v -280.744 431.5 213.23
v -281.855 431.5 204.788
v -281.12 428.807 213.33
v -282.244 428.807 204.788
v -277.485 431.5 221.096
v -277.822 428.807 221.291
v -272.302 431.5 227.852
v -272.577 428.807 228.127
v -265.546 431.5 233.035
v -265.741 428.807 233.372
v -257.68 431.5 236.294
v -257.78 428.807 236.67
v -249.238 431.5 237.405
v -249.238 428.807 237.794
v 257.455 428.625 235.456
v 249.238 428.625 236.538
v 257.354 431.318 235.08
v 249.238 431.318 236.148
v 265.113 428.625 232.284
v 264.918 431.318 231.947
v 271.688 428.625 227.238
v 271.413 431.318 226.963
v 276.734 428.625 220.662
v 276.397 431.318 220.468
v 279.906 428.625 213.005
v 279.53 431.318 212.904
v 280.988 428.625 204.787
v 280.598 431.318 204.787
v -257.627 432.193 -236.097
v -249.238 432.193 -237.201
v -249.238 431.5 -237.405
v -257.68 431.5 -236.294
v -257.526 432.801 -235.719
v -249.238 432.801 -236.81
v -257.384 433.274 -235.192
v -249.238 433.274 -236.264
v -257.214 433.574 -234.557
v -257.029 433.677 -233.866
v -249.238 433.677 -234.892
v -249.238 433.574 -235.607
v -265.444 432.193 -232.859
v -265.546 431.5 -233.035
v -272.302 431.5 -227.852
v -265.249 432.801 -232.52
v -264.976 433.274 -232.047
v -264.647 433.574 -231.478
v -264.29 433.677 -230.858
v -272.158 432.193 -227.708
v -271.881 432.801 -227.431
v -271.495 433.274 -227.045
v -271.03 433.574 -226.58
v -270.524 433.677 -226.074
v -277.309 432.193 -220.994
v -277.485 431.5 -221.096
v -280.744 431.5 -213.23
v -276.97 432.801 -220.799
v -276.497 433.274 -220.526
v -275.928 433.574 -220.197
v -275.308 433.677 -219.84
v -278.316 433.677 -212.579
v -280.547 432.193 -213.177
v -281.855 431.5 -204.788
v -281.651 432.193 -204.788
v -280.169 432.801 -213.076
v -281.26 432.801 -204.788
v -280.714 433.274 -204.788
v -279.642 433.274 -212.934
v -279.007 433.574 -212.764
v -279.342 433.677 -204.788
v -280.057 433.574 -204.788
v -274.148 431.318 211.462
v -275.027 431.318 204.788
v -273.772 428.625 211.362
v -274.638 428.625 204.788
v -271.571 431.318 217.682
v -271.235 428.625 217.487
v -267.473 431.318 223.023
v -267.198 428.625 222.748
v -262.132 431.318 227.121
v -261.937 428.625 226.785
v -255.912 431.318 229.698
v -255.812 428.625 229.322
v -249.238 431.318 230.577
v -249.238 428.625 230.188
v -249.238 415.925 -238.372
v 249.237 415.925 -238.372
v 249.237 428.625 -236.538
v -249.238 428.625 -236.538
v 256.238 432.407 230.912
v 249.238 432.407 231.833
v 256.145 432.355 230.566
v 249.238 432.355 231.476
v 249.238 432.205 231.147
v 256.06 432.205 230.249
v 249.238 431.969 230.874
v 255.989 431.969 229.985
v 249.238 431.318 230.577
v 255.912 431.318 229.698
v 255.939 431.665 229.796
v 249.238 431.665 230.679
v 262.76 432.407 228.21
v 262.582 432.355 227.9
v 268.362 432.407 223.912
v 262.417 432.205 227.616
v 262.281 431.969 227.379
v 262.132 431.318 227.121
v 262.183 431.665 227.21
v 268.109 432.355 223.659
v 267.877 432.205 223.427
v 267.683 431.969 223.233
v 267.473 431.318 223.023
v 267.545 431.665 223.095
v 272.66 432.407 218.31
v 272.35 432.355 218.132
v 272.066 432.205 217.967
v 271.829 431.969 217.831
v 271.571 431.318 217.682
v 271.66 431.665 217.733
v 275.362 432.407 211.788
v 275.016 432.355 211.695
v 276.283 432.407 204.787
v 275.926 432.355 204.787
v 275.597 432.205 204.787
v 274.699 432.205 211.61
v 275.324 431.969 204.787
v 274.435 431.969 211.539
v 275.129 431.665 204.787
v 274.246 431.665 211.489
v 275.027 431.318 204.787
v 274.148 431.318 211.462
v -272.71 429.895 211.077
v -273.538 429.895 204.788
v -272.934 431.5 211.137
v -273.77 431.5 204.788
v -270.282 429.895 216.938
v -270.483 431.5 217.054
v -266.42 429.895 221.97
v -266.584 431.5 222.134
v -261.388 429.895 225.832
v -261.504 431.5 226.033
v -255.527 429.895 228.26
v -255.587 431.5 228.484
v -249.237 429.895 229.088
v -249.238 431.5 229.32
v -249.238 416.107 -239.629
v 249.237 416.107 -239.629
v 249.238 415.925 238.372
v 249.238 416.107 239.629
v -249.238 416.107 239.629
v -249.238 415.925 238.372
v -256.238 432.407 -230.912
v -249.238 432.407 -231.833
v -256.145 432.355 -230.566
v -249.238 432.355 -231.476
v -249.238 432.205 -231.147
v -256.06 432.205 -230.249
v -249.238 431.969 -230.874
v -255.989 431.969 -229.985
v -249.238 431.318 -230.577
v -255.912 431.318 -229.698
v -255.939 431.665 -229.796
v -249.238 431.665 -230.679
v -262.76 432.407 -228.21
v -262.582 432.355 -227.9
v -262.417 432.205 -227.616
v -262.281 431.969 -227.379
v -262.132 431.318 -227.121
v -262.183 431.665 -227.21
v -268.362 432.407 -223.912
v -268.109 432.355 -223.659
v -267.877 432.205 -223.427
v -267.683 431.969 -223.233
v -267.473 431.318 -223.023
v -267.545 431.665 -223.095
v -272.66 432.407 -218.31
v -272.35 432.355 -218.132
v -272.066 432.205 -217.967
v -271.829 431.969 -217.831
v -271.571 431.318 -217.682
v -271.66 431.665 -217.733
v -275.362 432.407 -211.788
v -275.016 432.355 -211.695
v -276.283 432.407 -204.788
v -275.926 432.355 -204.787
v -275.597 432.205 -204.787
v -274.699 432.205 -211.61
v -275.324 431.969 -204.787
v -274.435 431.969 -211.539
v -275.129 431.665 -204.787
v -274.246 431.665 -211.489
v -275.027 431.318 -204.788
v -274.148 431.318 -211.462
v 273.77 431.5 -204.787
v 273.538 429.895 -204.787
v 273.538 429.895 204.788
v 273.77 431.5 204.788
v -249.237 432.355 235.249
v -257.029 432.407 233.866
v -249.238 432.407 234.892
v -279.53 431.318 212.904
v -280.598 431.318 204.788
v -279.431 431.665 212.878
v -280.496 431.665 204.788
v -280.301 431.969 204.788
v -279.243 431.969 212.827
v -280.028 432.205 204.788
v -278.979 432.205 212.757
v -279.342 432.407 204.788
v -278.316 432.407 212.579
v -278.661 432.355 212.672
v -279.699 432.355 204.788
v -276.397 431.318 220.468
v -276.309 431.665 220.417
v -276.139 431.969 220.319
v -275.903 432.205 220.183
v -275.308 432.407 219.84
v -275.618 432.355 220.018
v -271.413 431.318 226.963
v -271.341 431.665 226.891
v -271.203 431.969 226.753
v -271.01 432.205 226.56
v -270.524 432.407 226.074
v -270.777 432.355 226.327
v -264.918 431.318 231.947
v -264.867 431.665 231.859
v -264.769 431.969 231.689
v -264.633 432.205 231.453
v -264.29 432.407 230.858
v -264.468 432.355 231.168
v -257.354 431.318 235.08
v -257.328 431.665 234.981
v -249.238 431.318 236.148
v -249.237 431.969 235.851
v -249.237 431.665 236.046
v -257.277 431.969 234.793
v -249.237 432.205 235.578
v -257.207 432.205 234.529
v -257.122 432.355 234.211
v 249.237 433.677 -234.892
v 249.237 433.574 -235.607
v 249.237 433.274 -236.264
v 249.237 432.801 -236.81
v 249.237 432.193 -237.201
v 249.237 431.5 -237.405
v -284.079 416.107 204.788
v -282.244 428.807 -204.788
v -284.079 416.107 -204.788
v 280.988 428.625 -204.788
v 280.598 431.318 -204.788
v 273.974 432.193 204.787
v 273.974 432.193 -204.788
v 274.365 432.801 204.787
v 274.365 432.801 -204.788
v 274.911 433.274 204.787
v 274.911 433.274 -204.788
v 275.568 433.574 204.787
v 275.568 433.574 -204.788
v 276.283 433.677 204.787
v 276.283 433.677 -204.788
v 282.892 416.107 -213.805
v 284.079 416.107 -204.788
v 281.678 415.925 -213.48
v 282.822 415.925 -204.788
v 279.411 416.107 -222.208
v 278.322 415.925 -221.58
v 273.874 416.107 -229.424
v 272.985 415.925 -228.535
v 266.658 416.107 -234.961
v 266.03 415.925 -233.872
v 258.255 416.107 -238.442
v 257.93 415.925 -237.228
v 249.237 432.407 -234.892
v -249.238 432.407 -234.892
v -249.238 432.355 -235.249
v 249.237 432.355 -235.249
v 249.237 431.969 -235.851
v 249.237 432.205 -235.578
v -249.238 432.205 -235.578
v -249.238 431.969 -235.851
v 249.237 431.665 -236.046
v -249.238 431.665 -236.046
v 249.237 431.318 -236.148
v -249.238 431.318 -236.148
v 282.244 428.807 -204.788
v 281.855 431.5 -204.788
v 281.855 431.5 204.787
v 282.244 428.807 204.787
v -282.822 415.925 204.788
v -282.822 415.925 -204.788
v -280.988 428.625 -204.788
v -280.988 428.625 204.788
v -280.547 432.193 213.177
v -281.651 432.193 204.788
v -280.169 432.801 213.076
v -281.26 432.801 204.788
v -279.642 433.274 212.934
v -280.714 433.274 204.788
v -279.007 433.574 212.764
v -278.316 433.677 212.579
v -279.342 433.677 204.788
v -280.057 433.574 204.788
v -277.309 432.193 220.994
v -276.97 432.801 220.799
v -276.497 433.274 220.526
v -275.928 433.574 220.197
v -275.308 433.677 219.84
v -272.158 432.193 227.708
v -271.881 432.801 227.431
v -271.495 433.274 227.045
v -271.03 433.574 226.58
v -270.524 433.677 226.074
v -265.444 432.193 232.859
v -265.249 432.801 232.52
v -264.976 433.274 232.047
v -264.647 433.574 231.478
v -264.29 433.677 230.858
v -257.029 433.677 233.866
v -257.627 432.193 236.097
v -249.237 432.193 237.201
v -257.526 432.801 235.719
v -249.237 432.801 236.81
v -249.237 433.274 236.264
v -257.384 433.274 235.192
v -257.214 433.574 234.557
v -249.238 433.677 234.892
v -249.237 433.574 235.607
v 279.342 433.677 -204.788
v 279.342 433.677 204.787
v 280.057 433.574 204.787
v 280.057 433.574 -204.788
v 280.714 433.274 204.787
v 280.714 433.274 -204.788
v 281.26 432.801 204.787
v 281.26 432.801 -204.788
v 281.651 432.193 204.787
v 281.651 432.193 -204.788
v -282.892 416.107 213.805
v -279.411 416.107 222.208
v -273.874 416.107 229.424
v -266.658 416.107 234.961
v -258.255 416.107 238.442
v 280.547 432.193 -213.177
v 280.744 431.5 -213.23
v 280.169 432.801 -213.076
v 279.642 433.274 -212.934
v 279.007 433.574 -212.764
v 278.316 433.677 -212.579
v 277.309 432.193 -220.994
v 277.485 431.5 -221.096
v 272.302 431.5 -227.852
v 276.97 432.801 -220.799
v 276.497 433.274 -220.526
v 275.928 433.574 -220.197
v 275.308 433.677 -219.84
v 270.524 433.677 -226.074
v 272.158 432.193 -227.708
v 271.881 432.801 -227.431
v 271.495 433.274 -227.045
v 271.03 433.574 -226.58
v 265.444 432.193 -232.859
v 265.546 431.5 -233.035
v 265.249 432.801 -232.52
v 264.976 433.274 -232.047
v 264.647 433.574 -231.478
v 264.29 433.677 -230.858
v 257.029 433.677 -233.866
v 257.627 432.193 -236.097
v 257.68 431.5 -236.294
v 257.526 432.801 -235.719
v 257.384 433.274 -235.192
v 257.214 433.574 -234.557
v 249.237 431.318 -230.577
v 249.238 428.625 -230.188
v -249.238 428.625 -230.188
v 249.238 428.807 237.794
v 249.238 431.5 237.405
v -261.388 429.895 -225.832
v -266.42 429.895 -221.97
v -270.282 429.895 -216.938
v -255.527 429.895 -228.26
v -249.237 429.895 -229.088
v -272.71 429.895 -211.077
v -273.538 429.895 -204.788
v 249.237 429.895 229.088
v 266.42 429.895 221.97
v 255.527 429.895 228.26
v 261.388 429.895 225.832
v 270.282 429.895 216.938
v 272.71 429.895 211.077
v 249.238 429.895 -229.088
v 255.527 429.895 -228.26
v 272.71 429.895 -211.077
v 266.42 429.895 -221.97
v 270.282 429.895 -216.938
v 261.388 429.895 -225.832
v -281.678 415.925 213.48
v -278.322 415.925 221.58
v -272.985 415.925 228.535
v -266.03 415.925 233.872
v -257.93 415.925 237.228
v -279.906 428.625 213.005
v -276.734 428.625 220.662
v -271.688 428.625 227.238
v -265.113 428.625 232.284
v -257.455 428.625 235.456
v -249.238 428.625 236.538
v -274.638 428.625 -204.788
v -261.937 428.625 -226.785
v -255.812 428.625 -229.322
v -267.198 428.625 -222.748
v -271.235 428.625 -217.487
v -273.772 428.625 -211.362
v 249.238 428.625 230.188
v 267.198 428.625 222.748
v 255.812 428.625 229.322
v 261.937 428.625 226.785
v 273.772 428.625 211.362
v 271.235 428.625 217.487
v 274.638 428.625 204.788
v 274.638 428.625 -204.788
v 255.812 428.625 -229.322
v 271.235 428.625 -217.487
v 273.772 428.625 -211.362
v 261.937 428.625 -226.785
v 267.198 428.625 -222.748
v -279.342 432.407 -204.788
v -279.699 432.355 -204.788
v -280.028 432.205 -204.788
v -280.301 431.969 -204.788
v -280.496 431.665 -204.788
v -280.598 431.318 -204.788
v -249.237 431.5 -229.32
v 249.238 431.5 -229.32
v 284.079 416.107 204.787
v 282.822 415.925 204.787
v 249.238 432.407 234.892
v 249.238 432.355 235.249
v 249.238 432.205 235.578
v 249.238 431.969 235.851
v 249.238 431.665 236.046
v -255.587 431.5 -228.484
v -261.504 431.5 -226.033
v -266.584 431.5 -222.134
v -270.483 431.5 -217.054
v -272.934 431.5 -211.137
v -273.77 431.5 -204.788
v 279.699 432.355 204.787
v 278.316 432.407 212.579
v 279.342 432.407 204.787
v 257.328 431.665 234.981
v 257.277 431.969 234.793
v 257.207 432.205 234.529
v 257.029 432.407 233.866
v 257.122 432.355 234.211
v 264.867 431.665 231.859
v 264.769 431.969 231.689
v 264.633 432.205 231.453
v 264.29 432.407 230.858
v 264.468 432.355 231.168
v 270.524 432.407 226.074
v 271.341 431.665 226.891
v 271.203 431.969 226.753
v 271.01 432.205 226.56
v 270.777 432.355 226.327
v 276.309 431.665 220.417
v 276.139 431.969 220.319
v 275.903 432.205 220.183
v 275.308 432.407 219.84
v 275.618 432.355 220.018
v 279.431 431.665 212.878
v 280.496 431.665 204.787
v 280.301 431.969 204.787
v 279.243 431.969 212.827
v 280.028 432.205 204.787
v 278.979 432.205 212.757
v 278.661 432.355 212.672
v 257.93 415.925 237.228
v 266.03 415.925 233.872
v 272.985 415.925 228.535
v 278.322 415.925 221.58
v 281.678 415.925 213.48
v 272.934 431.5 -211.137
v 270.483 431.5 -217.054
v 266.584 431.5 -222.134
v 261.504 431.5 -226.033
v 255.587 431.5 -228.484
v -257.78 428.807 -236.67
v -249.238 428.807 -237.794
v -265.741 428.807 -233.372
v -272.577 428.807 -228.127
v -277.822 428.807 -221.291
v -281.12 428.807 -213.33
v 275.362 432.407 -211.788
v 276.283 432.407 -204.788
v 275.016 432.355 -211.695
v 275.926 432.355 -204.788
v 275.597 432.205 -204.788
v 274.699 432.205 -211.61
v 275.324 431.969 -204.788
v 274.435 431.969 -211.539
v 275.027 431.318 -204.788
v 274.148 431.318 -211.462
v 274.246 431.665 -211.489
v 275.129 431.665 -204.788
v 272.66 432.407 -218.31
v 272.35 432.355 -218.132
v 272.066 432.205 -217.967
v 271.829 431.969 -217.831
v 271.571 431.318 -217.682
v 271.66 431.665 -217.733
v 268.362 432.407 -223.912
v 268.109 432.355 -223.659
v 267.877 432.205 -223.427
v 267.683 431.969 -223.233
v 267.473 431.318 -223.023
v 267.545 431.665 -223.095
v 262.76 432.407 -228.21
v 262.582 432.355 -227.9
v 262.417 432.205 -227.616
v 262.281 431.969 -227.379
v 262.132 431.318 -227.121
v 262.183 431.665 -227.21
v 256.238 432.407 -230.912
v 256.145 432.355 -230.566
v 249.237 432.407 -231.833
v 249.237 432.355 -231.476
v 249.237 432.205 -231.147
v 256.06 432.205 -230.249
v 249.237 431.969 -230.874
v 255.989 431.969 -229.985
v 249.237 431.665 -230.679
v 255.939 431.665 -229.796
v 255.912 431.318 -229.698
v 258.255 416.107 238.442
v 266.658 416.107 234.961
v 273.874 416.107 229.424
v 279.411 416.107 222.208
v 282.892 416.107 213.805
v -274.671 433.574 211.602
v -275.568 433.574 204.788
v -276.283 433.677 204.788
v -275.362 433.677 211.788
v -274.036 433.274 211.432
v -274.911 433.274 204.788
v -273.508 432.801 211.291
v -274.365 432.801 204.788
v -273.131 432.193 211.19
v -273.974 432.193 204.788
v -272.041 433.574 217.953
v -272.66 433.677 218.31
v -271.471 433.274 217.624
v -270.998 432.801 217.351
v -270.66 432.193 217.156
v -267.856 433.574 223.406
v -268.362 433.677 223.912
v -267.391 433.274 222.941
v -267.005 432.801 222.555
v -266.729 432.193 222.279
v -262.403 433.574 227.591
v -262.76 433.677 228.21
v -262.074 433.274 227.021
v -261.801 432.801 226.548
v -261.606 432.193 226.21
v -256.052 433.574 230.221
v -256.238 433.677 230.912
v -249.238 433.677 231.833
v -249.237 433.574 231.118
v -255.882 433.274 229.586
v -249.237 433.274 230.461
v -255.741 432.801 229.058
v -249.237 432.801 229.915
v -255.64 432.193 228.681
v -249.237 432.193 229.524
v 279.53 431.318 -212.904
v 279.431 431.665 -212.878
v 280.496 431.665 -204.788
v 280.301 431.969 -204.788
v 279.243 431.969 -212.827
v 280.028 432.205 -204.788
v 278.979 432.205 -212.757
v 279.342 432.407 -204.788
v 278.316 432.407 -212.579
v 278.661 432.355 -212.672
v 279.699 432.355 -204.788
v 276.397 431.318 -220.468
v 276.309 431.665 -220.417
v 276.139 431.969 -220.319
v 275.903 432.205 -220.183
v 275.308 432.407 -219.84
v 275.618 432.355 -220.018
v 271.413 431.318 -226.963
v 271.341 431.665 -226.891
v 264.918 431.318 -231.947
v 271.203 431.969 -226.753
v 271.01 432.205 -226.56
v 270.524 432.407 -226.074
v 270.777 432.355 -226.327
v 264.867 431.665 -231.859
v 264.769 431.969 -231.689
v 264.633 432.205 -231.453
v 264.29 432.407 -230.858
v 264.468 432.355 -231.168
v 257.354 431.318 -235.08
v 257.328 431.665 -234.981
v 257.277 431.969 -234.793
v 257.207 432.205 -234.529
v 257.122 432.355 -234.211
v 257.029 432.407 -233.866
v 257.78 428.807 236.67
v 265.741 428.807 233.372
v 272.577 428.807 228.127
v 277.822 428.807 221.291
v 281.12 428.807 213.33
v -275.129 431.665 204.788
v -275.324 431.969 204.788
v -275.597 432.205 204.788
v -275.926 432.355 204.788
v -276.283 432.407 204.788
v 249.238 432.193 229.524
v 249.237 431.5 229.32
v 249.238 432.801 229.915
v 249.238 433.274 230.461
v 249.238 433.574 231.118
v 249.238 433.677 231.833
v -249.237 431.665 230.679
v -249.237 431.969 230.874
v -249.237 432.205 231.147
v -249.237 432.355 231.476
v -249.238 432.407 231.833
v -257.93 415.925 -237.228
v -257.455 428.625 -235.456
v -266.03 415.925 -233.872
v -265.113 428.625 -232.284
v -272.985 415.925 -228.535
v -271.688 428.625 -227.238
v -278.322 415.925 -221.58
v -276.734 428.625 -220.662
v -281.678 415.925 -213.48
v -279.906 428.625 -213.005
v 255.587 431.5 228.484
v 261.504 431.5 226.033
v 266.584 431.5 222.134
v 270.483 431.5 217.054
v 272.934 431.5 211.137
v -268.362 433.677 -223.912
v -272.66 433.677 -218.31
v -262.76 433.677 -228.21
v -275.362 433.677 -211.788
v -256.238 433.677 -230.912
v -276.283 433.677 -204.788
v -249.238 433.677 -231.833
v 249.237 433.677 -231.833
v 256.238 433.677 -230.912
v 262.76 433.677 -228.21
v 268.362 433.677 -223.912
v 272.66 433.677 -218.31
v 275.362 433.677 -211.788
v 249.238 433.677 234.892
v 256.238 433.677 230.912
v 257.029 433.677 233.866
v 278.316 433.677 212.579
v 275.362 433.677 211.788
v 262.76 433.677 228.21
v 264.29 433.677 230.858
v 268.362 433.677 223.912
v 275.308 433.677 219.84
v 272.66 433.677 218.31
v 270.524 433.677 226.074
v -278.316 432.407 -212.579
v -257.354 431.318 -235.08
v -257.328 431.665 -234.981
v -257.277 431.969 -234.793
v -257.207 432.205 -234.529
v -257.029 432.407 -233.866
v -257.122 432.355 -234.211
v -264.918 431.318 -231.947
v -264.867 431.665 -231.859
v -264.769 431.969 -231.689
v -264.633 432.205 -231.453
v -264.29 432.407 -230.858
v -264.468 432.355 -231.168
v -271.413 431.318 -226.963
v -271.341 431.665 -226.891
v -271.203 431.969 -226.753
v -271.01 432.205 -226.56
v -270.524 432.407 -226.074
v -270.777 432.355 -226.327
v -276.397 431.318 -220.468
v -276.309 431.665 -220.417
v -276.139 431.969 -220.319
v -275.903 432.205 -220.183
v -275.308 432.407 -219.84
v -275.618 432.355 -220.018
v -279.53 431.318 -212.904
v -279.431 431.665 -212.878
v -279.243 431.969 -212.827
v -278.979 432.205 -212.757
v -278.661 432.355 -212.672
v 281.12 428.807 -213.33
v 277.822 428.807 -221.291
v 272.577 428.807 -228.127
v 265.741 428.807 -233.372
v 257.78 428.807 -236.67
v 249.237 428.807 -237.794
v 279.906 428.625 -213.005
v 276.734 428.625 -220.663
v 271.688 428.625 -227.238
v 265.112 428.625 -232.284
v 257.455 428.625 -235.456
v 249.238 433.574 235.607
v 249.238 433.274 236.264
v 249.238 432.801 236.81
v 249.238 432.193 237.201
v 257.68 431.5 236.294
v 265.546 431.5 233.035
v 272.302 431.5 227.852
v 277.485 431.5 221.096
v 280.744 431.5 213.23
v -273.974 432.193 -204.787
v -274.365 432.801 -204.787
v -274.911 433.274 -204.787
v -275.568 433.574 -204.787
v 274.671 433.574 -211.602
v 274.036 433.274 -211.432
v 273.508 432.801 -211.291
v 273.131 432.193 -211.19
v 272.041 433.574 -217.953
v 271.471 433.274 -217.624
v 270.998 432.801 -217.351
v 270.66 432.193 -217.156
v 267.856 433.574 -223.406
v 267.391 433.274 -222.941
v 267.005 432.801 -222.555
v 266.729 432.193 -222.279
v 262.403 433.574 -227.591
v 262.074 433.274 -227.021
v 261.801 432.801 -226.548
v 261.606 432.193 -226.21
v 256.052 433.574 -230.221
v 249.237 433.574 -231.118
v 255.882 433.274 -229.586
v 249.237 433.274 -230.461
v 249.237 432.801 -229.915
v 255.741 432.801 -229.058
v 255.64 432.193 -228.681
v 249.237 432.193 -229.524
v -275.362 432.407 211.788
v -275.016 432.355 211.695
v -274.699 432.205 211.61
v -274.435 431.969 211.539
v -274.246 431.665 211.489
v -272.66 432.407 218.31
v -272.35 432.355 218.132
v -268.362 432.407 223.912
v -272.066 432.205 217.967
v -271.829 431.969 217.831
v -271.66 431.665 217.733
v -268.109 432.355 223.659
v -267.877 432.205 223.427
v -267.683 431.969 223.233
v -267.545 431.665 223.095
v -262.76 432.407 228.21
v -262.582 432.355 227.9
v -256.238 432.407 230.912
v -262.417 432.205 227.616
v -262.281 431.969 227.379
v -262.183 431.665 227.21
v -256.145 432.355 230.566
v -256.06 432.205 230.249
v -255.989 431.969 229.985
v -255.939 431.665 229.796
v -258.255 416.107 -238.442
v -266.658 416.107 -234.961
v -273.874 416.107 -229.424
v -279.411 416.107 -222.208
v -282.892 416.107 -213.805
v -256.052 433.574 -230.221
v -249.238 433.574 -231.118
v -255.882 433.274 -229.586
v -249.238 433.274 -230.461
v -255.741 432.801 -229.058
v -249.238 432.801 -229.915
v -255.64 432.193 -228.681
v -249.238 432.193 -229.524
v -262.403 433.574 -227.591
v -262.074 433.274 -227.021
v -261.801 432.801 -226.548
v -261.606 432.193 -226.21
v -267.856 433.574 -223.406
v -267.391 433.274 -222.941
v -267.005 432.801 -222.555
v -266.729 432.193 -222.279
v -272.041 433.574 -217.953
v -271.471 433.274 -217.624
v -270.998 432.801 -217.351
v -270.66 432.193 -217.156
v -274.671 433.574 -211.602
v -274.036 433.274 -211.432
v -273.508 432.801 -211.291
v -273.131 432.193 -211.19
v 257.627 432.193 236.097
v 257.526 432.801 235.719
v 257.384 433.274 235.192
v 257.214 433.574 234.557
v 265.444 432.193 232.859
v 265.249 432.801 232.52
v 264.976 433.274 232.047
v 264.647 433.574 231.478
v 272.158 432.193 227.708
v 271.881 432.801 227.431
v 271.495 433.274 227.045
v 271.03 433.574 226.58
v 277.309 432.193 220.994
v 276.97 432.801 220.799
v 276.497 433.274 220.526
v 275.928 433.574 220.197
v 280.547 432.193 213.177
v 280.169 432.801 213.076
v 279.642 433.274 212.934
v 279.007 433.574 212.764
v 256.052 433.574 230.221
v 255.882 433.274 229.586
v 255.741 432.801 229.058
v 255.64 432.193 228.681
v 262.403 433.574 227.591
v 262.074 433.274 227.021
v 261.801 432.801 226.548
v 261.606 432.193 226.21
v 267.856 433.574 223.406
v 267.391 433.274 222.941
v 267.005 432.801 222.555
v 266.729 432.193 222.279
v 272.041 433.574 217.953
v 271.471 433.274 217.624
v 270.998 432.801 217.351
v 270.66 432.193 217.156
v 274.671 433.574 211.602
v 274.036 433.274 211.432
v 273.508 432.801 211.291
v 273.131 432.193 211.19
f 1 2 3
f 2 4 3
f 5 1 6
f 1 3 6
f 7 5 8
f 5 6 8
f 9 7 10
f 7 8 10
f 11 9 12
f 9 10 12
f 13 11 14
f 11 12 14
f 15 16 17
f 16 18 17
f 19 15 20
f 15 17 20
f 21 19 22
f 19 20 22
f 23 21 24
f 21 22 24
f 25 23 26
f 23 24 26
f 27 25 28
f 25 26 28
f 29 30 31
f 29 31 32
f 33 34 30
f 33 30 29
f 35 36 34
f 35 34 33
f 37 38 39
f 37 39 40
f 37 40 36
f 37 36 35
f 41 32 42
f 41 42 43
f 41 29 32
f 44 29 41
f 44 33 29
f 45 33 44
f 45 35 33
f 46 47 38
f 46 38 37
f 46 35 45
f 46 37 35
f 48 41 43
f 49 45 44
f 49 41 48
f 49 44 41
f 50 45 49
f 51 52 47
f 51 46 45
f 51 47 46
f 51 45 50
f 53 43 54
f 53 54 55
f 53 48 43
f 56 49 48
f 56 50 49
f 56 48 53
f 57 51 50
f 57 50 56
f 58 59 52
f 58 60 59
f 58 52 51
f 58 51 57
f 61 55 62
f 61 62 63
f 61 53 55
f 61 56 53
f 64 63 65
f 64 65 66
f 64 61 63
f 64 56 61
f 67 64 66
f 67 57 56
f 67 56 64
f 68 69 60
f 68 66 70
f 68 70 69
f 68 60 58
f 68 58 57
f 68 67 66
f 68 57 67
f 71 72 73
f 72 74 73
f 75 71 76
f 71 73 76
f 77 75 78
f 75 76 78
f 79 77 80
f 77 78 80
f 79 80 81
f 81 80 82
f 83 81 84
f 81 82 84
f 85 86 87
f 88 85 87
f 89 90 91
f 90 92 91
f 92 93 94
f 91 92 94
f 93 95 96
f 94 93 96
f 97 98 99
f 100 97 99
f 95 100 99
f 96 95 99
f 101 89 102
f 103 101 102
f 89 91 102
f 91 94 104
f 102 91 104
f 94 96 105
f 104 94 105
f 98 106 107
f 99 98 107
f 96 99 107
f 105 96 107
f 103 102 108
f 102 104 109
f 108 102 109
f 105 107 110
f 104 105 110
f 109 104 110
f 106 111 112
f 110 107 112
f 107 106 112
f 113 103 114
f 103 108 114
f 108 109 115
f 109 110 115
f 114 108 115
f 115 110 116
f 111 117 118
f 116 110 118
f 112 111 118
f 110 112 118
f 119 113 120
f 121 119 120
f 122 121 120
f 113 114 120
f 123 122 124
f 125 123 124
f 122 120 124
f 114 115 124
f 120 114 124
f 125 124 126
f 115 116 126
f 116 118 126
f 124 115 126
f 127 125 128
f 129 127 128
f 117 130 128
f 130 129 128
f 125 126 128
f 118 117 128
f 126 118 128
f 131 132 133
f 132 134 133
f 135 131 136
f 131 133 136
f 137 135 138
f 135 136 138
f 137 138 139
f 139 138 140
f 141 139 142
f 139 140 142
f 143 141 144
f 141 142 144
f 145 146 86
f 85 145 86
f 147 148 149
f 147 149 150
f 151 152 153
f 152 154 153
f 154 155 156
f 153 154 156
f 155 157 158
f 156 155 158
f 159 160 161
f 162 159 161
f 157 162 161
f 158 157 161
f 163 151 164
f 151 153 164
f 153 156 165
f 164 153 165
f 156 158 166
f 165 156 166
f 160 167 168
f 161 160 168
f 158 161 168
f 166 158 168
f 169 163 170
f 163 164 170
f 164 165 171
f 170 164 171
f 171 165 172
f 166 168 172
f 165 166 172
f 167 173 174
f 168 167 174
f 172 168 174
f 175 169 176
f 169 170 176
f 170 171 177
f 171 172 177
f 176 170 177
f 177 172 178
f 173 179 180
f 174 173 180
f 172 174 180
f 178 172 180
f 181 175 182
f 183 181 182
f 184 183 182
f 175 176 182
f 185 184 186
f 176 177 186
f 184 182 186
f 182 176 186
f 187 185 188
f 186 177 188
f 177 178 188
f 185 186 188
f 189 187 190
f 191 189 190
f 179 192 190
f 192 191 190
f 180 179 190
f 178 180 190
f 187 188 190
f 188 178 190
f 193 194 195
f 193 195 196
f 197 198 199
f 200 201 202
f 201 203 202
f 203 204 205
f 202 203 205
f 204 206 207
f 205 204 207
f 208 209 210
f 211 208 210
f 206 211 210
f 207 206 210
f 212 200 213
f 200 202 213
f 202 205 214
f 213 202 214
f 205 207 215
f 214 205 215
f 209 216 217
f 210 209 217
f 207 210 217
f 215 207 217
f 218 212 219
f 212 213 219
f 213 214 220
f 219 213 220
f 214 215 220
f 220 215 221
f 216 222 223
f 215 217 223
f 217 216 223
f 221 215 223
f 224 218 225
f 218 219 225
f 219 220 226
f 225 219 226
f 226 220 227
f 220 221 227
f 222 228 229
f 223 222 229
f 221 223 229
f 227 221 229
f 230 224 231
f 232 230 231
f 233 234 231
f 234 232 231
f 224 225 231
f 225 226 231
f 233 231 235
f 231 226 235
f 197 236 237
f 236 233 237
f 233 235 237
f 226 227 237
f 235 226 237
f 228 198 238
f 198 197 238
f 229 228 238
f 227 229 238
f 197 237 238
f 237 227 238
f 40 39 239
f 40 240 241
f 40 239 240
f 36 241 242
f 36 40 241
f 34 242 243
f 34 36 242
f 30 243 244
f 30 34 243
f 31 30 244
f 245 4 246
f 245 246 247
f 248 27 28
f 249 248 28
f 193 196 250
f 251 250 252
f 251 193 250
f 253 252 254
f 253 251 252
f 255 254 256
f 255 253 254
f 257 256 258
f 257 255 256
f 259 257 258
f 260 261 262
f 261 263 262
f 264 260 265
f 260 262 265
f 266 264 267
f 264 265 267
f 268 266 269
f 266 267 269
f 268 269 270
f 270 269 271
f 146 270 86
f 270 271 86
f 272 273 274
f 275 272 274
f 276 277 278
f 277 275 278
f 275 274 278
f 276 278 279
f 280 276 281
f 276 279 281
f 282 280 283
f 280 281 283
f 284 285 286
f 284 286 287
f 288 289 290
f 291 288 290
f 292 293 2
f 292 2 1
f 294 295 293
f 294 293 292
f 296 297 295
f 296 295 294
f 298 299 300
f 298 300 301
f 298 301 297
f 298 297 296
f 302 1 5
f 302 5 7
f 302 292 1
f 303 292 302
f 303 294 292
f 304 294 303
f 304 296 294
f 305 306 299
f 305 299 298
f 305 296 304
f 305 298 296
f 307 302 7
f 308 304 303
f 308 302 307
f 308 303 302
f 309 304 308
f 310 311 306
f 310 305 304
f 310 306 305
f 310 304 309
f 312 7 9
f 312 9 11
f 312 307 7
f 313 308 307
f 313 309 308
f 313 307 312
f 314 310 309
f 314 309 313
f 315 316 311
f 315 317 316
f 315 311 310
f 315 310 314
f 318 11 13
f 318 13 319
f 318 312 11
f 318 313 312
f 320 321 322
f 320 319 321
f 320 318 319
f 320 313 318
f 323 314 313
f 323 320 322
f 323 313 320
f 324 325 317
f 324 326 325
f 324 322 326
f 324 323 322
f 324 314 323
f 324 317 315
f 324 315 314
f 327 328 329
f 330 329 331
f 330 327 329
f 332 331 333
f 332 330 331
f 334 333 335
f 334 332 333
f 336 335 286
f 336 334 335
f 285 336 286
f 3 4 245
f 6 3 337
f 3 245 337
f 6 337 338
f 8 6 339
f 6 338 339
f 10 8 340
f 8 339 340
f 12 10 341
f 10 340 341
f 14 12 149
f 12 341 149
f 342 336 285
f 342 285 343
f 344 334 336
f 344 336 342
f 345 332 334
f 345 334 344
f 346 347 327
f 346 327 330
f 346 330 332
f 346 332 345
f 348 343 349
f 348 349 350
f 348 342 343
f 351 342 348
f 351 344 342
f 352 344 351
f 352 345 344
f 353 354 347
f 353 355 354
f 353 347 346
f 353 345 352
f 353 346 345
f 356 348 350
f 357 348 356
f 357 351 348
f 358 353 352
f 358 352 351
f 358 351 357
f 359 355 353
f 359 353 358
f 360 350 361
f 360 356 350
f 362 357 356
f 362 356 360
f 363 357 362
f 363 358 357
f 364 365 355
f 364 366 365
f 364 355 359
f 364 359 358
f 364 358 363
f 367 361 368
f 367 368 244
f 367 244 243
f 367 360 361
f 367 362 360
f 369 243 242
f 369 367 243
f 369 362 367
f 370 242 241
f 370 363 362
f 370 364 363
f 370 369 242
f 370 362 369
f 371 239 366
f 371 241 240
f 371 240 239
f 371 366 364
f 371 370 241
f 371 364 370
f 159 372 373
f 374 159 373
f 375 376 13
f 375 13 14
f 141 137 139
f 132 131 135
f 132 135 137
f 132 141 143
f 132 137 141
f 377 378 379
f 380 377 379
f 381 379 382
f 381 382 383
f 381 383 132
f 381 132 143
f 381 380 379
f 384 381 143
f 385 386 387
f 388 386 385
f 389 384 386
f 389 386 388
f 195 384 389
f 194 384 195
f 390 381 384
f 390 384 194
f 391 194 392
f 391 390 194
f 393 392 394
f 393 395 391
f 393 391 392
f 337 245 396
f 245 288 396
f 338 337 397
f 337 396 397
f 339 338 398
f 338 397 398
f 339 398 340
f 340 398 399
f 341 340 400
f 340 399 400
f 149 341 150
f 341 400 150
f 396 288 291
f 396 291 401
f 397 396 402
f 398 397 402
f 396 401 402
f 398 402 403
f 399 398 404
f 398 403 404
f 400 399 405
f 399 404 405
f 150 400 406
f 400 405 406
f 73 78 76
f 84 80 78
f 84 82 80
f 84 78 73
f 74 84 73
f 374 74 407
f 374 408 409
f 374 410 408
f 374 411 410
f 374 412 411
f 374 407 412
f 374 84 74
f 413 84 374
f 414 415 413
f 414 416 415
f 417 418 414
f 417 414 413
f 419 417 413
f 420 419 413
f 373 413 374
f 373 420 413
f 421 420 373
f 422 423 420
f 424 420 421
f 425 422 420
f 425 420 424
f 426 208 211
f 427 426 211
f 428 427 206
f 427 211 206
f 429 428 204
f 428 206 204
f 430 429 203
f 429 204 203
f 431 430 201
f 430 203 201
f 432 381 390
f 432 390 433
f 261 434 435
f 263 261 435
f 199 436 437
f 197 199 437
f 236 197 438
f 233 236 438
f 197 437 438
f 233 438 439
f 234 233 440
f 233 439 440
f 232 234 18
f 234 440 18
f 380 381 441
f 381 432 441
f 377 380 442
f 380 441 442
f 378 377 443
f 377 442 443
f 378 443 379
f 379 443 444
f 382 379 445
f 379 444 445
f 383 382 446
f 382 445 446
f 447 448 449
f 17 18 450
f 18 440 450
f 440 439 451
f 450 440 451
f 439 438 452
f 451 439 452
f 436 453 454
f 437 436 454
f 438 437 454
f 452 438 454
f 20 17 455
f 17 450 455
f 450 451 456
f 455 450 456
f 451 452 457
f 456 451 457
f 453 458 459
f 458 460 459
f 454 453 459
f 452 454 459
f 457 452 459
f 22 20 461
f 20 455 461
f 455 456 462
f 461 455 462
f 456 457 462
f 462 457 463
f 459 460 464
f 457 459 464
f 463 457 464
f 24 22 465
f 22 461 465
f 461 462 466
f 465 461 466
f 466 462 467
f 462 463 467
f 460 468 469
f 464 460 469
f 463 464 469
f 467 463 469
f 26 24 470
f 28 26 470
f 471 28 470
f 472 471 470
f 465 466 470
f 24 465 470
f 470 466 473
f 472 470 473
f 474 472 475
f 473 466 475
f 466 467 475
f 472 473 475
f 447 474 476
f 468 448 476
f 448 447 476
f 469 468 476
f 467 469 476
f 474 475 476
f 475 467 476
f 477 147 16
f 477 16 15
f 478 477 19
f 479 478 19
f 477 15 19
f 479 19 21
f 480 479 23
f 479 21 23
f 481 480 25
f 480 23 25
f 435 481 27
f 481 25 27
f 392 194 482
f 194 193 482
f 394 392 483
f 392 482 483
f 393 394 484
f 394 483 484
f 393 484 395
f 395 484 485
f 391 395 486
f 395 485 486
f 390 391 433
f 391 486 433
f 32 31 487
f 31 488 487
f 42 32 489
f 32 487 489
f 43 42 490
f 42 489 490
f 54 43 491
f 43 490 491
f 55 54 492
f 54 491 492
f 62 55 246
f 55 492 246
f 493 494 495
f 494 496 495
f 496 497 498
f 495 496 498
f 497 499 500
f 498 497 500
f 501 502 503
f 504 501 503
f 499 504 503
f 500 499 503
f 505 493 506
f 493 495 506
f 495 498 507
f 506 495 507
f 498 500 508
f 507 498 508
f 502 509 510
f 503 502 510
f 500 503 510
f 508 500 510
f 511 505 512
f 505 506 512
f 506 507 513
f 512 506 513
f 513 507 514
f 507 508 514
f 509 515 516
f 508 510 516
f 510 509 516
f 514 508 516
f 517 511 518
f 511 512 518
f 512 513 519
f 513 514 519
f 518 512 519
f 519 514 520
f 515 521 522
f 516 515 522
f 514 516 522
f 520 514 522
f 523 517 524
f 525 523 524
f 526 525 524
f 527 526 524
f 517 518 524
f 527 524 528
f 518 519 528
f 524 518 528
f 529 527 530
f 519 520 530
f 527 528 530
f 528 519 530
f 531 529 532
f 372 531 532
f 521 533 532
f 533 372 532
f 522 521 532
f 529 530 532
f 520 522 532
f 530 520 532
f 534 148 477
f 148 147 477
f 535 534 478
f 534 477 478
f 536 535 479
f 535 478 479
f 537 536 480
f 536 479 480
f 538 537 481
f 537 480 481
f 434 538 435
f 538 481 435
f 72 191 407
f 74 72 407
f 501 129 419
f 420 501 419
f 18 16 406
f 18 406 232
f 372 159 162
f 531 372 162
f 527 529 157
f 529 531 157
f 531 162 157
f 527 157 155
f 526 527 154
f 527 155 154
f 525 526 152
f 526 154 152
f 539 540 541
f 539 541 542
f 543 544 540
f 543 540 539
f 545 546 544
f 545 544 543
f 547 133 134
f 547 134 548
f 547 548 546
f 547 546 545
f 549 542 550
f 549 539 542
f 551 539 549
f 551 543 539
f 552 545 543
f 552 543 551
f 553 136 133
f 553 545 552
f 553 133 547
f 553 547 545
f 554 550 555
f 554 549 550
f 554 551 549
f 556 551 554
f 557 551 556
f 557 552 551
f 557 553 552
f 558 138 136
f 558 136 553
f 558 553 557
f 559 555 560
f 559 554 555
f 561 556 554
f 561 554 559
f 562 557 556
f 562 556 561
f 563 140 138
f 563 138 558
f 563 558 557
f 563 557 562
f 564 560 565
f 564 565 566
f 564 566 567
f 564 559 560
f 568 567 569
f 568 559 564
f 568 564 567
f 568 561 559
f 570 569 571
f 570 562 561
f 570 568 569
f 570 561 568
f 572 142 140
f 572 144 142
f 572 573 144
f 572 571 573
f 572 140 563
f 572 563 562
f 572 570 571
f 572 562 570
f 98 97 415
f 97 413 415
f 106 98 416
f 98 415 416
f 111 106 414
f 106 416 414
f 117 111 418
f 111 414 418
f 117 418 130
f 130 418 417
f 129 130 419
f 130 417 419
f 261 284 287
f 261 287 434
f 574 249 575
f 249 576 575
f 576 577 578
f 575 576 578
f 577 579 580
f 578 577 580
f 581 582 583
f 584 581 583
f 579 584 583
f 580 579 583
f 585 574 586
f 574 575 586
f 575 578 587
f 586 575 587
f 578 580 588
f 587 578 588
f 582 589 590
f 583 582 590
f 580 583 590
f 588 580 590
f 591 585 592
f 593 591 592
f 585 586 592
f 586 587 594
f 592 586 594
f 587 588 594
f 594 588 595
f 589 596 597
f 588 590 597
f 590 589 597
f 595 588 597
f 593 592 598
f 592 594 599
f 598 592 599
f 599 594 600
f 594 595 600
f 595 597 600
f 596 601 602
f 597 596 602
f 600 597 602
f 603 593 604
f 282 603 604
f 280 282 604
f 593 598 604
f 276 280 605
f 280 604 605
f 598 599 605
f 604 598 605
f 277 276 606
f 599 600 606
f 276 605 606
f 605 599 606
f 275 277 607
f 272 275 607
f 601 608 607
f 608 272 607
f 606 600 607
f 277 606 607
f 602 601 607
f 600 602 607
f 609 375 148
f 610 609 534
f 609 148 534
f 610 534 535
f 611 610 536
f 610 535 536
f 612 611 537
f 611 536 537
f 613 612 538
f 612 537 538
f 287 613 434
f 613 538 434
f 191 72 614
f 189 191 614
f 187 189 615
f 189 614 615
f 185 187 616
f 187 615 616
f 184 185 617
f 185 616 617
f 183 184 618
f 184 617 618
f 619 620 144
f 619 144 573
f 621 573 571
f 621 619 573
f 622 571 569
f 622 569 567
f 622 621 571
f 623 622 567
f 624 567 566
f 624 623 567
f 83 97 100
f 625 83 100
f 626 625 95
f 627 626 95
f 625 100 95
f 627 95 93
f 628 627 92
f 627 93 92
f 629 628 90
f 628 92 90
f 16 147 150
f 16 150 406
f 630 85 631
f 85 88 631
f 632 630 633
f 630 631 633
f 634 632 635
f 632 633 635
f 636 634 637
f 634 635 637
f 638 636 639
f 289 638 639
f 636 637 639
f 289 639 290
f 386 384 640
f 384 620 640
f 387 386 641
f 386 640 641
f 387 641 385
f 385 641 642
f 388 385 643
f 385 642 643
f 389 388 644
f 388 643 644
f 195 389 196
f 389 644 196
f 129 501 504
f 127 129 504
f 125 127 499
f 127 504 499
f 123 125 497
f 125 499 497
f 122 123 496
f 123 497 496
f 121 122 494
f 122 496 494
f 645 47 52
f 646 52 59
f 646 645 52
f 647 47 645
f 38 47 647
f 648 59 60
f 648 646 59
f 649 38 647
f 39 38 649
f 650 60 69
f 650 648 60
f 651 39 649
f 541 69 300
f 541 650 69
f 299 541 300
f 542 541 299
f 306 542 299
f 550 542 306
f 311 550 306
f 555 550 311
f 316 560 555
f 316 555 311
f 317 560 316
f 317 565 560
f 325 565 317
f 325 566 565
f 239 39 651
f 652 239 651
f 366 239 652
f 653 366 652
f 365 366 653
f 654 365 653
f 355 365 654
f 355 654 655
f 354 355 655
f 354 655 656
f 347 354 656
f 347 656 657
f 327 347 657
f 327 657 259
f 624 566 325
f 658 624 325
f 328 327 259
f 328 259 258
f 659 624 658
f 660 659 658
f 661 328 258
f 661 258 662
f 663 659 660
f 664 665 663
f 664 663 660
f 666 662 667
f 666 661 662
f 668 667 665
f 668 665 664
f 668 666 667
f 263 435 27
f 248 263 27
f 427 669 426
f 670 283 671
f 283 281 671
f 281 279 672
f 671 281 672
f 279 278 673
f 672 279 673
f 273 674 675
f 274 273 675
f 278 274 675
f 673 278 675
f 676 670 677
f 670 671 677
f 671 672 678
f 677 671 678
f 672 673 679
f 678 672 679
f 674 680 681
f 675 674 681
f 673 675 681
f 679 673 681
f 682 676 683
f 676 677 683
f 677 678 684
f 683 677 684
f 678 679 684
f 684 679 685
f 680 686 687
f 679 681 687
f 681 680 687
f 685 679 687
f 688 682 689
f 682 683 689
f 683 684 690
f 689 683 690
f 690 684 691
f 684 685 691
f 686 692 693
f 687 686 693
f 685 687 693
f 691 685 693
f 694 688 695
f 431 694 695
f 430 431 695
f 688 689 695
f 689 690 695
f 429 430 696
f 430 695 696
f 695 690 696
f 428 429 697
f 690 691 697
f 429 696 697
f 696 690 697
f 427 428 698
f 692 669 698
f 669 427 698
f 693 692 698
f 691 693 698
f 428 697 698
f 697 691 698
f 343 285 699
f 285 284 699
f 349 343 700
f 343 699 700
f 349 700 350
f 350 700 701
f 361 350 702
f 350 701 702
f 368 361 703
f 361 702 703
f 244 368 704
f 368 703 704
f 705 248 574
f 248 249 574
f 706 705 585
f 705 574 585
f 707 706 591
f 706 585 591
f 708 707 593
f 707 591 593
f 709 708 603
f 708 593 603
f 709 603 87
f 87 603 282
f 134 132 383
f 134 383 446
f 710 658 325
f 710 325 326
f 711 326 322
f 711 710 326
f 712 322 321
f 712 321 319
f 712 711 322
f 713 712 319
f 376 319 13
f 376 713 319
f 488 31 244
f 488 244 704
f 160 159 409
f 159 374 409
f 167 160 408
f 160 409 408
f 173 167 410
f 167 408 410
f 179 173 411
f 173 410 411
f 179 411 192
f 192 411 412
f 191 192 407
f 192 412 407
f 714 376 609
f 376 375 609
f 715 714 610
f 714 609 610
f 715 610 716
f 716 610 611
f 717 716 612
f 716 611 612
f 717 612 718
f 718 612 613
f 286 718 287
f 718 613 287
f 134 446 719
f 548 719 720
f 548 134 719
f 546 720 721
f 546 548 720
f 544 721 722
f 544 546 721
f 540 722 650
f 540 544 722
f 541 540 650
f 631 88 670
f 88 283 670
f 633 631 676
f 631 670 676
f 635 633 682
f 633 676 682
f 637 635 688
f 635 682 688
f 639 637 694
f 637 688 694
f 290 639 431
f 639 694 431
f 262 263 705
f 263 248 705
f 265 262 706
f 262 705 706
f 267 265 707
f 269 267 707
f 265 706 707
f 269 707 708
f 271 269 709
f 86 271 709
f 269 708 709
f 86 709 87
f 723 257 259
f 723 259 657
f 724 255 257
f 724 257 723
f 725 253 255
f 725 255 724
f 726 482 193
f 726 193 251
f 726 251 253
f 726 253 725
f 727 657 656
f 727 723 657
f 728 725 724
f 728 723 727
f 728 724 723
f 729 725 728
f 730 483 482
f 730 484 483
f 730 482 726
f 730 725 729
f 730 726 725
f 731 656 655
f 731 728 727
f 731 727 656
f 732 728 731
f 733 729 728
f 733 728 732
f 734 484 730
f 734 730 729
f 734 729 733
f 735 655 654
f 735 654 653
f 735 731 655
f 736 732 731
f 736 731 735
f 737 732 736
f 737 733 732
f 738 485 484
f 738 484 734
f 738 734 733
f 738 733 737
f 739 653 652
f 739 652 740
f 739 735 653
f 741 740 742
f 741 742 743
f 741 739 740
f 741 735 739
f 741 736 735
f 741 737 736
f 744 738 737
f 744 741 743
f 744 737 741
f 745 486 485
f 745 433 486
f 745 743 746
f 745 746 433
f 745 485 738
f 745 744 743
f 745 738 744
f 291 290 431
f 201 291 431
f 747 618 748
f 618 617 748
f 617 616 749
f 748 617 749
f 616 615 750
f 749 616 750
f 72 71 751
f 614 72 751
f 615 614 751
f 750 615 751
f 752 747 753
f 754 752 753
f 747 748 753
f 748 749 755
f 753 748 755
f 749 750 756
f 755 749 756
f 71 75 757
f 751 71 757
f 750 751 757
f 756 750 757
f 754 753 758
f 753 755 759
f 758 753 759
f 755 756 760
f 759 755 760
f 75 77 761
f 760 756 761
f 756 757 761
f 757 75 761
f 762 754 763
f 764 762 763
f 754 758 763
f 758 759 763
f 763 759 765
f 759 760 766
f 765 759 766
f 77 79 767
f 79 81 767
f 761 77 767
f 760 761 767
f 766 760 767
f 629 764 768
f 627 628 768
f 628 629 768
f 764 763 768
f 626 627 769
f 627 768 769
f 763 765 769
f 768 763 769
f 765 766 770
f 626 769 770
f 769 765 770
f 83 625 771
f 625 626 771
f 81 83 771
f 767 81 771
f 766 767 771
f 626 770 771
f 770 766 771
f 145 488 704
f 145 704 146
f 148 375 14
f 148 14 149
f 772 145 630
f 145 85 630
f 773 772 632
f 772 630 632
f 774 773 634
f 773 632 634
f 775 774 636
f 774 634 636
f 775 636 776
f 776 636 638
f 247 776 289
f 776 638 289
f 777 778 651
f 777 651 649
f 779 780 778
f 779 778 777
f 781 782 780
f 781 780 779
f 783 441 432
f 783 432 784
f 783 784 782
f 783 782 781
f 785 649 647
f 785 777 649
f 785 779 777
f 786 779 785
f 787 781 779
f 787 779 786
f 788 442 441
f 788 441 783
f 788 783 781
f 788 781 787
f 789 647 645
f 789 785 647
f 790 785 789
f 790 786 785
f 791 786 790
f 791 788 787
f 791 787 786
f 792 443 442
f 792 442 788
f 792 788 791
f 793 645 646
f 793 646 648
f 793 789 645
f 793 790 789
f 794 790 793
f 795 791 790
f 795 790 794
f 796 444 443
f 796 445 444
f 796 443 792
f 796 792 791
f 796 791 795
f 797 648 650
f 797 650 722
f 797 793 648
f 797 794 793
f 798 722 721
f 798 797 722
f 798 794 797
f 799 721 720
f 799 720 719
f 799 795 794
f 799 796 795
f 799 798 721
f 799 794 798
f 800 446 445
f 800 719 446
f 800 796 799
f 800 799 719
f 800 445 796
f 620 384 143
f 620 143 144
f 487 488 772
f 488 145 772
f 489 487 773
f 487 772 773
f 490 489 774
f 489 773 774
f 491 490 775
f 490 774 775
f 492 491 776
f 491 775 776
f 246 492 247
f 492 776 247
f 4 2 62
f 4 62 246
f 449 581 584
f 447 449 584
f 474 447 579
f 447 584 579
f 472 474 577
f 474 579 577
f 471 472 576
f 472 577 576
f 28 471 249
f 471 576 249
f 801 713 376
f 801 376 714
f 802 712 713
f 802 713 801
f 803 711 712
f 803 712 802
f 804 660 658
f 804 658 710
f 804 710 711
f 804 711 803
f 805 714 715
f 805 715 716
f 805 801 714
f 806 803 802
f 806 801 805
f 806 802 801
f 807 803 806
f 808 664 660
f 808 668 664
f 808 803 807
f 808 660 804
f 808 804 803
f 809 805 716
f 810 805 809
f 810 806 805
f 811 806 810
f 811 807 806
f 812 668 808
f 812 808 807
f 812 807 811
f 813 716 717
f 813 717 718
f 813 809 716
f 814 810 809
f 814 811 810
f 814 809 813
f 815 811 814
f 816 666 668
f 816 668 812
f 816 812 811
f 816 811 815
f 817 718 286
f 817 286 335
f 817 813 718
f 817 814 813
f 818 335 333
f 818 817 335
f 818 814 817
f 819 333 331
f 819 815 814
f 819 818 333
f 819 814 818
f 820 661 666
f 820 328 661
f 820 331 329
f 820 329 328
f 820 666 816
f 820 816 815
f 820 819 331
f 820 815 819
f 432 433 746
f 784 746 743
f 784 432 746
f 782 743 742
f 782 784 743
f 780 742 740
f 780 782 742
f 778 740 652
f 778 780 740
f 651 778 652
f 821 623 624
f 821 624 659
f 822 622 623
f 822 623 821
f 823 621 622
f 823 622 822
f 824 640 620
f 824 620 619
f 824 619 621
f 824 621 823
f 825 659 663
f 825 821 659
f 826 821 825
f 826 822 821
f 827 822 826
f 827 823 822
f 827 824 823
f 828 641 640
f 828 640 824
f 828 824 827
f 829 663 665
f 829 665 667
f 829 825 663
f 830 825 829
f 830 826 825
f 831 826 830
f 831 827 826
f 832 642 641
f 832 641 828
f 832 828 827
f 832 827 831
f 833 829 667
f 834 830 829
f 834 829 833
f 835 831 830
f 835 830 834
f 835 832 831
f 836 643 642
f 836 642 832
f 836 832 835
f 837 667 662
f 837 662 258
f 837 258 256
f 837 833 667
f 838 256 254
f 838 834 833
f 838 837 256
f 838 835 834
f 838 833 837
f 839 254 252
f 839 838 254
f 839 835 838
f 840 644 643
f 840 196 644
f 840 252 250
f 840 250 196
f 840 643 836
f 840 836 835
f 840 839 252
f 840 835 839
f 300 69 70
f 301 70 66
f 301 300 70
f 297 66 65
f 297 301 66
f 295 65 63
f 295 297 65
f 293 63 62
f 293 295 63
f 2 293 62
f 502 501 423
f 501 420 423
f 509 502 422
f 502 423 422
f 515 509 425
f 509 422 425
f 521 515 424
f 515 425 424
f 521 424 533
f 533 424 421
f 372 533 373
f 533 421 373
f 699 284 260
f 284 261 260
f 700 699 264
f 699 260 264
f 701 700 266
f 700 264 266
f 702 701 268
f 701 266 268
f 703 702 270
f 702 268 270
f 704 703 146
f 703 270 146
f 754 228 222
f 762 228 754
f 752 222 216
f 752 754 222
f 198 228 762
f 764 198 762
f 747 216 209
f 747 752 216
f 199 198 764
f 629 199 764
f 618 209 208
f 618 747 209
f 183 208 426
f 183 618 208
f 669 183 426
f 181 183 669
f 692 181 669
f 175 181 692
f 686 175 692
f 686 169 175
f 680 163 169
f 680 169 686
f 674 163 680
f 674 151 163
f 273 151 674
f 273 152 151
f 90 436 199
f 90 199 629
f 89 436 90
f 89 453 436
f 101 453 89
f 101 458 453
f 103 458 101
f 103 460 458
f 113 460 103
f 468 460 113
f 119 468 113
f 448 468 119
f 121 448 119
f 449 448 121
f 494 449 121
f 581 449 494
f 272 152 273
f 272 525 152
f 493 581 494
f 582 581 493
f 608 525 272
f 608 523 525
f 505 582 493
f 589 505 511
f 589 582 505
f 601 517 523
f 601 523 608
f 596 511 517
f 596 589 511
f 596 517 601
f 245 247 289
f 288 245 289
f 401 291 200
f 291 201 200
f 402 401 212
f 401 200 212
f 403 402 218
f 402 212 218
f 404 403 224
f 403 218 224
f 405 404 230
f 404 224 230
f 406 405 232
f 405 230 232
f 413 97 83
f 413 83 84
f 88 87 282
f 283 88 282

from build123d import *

# Parameters (mm, degrees)
BOSS_EXTRUDE1_START = 1.27
BOSS_EXTRUDE1_DEPTH = 1.27


with BuildPart() as part:
    # Sweep1: sweep along a path in Sketch2
    with BuildLine(Plane(origin=(0, 428.625, 0), x_dir=(1, 0, 0), z_dir=(0, 1, 0))) as sweep1_path:
        Line((-249.2375, -230.1875), (249.2375, -230.1875))
        ThreePointArc((249.2375, -230.1875), (267.198012242, -222.748012242), (274.6375, -204.7875))
        Line((274.6375, -204.7875), (274.6375, 204.7875))
        ThreePointArc((274.6375, 204.7875), (267.198012242, 222.748012242), (249.2375, 230.1875))
        Line((249.2375, 230.1875), (-249.2375, 230.1875))
        ThreePointArc((-249.2375, 230.1875), (-267.198012242, 222.748012242), (-274.6375, 204.7875))
        Line((-274.6375, 204.7875), (-274.6375, -204.7875))
        ThreePointArc((-274.6375, -204.7875), (-267.198012242, -222.748012242), (-249.2375, -230.1875))
    # Sketch3 → Sweep1 (sweep)
    with BuildSketch(Plane.XY):
        with BuildLine():
            Line((-274.6375, 428.625), (-275.02653488, 431.318318399))
            ThreePointArc((-275.02653488, 431.318318399), (-275.452129987, 432.096831513), (-276.283489893, 432.406758231))
            Line((-276.283489893, 432.406758231), (-279.341510107, 432.406758231))
            ThreePointArc((-279.341510107, 432.406758231), (-280.172870013, 432.096831513), (-280.59846512, 431.318318399))
            Line((-280.59846512, 431.318318399), (-280.9875, 428.625))
            Line((-280.9875, 428.625), (-282.821944444, 415.925))
            Line((-282.821944444, 415.925), (-284.078899458, 416.106560169))
            Line((-284.078899458, 416.106560169), (-282.244455013, 428.806560169))
            Line((-282.244455013, 428.806560169), (-281.855420133, 431.499878568))
            ThreePointArc((-281.855420133, 431.499878568), (-281.004229918, 433.056904795), (-279.341510107, 433.676758231))
            Line((-279.341510107, 433.676758231), (-276.283489893, 433.676758231))
            ThreePointArc((-276.283489893, 433.676758231), (-274.620770082, 433.056904795), (-273.769579867, 431.499878568))
            Line((-273.769579867, 431.499878568), (-273.537764074, 429.895))
            Line((-273.537764074, 429.895), (-273.537764074, 428.625))
            Line((-273.537764074, 428.625), (-274.6375, 428.625))
        make_face()
    sweep(path=sweep1_path.line)

    # Sketch6 → Boss-Extrude1 (add)
    with BuildSketch(Plane(origin=(0, 428.625, 0), x_dir=(1, 0, 0), z_dir=(0, 1, 0)).offset(BOSS_EXTRUDE1_START)):
        with BuildLine():
            Line((249.2375, 229.087764074), (-249.2375, 229.087764074))
            ThreePointArc((-249.2375, 229.087764074), (-266.420381511, 221.970381511), (-273.537764074, 204.7875))
            Line((-273.537764074, 204.7875), (-273.537764074, 0))
            Line((-273.537764074, 0), (-273.537764074, -204.7875))
            ThreePointArc((-273.537764074, -204.7875), (-266.420381511, -221.970381511), (-249.2375, -229.087764074))
            Line((-249.2375, -229.087764074), (249.2375, -229.087764074))
            ThreePointArc((249.2375, -229.087764074), (266.420381511, -221.970381511), (273.537764074, -204.7875))
            Line((273.537764074, -204.7875), (273.537764074, 204.7875))
            ThreePointArc((273.537764074, 204.7875), (266.420381511, 221.970381511), (249.2375, 229.087764074))
        make_face()
    extrude(amount=-BOSS_EXTRUDE1_DEPTH)


solid = part.part
